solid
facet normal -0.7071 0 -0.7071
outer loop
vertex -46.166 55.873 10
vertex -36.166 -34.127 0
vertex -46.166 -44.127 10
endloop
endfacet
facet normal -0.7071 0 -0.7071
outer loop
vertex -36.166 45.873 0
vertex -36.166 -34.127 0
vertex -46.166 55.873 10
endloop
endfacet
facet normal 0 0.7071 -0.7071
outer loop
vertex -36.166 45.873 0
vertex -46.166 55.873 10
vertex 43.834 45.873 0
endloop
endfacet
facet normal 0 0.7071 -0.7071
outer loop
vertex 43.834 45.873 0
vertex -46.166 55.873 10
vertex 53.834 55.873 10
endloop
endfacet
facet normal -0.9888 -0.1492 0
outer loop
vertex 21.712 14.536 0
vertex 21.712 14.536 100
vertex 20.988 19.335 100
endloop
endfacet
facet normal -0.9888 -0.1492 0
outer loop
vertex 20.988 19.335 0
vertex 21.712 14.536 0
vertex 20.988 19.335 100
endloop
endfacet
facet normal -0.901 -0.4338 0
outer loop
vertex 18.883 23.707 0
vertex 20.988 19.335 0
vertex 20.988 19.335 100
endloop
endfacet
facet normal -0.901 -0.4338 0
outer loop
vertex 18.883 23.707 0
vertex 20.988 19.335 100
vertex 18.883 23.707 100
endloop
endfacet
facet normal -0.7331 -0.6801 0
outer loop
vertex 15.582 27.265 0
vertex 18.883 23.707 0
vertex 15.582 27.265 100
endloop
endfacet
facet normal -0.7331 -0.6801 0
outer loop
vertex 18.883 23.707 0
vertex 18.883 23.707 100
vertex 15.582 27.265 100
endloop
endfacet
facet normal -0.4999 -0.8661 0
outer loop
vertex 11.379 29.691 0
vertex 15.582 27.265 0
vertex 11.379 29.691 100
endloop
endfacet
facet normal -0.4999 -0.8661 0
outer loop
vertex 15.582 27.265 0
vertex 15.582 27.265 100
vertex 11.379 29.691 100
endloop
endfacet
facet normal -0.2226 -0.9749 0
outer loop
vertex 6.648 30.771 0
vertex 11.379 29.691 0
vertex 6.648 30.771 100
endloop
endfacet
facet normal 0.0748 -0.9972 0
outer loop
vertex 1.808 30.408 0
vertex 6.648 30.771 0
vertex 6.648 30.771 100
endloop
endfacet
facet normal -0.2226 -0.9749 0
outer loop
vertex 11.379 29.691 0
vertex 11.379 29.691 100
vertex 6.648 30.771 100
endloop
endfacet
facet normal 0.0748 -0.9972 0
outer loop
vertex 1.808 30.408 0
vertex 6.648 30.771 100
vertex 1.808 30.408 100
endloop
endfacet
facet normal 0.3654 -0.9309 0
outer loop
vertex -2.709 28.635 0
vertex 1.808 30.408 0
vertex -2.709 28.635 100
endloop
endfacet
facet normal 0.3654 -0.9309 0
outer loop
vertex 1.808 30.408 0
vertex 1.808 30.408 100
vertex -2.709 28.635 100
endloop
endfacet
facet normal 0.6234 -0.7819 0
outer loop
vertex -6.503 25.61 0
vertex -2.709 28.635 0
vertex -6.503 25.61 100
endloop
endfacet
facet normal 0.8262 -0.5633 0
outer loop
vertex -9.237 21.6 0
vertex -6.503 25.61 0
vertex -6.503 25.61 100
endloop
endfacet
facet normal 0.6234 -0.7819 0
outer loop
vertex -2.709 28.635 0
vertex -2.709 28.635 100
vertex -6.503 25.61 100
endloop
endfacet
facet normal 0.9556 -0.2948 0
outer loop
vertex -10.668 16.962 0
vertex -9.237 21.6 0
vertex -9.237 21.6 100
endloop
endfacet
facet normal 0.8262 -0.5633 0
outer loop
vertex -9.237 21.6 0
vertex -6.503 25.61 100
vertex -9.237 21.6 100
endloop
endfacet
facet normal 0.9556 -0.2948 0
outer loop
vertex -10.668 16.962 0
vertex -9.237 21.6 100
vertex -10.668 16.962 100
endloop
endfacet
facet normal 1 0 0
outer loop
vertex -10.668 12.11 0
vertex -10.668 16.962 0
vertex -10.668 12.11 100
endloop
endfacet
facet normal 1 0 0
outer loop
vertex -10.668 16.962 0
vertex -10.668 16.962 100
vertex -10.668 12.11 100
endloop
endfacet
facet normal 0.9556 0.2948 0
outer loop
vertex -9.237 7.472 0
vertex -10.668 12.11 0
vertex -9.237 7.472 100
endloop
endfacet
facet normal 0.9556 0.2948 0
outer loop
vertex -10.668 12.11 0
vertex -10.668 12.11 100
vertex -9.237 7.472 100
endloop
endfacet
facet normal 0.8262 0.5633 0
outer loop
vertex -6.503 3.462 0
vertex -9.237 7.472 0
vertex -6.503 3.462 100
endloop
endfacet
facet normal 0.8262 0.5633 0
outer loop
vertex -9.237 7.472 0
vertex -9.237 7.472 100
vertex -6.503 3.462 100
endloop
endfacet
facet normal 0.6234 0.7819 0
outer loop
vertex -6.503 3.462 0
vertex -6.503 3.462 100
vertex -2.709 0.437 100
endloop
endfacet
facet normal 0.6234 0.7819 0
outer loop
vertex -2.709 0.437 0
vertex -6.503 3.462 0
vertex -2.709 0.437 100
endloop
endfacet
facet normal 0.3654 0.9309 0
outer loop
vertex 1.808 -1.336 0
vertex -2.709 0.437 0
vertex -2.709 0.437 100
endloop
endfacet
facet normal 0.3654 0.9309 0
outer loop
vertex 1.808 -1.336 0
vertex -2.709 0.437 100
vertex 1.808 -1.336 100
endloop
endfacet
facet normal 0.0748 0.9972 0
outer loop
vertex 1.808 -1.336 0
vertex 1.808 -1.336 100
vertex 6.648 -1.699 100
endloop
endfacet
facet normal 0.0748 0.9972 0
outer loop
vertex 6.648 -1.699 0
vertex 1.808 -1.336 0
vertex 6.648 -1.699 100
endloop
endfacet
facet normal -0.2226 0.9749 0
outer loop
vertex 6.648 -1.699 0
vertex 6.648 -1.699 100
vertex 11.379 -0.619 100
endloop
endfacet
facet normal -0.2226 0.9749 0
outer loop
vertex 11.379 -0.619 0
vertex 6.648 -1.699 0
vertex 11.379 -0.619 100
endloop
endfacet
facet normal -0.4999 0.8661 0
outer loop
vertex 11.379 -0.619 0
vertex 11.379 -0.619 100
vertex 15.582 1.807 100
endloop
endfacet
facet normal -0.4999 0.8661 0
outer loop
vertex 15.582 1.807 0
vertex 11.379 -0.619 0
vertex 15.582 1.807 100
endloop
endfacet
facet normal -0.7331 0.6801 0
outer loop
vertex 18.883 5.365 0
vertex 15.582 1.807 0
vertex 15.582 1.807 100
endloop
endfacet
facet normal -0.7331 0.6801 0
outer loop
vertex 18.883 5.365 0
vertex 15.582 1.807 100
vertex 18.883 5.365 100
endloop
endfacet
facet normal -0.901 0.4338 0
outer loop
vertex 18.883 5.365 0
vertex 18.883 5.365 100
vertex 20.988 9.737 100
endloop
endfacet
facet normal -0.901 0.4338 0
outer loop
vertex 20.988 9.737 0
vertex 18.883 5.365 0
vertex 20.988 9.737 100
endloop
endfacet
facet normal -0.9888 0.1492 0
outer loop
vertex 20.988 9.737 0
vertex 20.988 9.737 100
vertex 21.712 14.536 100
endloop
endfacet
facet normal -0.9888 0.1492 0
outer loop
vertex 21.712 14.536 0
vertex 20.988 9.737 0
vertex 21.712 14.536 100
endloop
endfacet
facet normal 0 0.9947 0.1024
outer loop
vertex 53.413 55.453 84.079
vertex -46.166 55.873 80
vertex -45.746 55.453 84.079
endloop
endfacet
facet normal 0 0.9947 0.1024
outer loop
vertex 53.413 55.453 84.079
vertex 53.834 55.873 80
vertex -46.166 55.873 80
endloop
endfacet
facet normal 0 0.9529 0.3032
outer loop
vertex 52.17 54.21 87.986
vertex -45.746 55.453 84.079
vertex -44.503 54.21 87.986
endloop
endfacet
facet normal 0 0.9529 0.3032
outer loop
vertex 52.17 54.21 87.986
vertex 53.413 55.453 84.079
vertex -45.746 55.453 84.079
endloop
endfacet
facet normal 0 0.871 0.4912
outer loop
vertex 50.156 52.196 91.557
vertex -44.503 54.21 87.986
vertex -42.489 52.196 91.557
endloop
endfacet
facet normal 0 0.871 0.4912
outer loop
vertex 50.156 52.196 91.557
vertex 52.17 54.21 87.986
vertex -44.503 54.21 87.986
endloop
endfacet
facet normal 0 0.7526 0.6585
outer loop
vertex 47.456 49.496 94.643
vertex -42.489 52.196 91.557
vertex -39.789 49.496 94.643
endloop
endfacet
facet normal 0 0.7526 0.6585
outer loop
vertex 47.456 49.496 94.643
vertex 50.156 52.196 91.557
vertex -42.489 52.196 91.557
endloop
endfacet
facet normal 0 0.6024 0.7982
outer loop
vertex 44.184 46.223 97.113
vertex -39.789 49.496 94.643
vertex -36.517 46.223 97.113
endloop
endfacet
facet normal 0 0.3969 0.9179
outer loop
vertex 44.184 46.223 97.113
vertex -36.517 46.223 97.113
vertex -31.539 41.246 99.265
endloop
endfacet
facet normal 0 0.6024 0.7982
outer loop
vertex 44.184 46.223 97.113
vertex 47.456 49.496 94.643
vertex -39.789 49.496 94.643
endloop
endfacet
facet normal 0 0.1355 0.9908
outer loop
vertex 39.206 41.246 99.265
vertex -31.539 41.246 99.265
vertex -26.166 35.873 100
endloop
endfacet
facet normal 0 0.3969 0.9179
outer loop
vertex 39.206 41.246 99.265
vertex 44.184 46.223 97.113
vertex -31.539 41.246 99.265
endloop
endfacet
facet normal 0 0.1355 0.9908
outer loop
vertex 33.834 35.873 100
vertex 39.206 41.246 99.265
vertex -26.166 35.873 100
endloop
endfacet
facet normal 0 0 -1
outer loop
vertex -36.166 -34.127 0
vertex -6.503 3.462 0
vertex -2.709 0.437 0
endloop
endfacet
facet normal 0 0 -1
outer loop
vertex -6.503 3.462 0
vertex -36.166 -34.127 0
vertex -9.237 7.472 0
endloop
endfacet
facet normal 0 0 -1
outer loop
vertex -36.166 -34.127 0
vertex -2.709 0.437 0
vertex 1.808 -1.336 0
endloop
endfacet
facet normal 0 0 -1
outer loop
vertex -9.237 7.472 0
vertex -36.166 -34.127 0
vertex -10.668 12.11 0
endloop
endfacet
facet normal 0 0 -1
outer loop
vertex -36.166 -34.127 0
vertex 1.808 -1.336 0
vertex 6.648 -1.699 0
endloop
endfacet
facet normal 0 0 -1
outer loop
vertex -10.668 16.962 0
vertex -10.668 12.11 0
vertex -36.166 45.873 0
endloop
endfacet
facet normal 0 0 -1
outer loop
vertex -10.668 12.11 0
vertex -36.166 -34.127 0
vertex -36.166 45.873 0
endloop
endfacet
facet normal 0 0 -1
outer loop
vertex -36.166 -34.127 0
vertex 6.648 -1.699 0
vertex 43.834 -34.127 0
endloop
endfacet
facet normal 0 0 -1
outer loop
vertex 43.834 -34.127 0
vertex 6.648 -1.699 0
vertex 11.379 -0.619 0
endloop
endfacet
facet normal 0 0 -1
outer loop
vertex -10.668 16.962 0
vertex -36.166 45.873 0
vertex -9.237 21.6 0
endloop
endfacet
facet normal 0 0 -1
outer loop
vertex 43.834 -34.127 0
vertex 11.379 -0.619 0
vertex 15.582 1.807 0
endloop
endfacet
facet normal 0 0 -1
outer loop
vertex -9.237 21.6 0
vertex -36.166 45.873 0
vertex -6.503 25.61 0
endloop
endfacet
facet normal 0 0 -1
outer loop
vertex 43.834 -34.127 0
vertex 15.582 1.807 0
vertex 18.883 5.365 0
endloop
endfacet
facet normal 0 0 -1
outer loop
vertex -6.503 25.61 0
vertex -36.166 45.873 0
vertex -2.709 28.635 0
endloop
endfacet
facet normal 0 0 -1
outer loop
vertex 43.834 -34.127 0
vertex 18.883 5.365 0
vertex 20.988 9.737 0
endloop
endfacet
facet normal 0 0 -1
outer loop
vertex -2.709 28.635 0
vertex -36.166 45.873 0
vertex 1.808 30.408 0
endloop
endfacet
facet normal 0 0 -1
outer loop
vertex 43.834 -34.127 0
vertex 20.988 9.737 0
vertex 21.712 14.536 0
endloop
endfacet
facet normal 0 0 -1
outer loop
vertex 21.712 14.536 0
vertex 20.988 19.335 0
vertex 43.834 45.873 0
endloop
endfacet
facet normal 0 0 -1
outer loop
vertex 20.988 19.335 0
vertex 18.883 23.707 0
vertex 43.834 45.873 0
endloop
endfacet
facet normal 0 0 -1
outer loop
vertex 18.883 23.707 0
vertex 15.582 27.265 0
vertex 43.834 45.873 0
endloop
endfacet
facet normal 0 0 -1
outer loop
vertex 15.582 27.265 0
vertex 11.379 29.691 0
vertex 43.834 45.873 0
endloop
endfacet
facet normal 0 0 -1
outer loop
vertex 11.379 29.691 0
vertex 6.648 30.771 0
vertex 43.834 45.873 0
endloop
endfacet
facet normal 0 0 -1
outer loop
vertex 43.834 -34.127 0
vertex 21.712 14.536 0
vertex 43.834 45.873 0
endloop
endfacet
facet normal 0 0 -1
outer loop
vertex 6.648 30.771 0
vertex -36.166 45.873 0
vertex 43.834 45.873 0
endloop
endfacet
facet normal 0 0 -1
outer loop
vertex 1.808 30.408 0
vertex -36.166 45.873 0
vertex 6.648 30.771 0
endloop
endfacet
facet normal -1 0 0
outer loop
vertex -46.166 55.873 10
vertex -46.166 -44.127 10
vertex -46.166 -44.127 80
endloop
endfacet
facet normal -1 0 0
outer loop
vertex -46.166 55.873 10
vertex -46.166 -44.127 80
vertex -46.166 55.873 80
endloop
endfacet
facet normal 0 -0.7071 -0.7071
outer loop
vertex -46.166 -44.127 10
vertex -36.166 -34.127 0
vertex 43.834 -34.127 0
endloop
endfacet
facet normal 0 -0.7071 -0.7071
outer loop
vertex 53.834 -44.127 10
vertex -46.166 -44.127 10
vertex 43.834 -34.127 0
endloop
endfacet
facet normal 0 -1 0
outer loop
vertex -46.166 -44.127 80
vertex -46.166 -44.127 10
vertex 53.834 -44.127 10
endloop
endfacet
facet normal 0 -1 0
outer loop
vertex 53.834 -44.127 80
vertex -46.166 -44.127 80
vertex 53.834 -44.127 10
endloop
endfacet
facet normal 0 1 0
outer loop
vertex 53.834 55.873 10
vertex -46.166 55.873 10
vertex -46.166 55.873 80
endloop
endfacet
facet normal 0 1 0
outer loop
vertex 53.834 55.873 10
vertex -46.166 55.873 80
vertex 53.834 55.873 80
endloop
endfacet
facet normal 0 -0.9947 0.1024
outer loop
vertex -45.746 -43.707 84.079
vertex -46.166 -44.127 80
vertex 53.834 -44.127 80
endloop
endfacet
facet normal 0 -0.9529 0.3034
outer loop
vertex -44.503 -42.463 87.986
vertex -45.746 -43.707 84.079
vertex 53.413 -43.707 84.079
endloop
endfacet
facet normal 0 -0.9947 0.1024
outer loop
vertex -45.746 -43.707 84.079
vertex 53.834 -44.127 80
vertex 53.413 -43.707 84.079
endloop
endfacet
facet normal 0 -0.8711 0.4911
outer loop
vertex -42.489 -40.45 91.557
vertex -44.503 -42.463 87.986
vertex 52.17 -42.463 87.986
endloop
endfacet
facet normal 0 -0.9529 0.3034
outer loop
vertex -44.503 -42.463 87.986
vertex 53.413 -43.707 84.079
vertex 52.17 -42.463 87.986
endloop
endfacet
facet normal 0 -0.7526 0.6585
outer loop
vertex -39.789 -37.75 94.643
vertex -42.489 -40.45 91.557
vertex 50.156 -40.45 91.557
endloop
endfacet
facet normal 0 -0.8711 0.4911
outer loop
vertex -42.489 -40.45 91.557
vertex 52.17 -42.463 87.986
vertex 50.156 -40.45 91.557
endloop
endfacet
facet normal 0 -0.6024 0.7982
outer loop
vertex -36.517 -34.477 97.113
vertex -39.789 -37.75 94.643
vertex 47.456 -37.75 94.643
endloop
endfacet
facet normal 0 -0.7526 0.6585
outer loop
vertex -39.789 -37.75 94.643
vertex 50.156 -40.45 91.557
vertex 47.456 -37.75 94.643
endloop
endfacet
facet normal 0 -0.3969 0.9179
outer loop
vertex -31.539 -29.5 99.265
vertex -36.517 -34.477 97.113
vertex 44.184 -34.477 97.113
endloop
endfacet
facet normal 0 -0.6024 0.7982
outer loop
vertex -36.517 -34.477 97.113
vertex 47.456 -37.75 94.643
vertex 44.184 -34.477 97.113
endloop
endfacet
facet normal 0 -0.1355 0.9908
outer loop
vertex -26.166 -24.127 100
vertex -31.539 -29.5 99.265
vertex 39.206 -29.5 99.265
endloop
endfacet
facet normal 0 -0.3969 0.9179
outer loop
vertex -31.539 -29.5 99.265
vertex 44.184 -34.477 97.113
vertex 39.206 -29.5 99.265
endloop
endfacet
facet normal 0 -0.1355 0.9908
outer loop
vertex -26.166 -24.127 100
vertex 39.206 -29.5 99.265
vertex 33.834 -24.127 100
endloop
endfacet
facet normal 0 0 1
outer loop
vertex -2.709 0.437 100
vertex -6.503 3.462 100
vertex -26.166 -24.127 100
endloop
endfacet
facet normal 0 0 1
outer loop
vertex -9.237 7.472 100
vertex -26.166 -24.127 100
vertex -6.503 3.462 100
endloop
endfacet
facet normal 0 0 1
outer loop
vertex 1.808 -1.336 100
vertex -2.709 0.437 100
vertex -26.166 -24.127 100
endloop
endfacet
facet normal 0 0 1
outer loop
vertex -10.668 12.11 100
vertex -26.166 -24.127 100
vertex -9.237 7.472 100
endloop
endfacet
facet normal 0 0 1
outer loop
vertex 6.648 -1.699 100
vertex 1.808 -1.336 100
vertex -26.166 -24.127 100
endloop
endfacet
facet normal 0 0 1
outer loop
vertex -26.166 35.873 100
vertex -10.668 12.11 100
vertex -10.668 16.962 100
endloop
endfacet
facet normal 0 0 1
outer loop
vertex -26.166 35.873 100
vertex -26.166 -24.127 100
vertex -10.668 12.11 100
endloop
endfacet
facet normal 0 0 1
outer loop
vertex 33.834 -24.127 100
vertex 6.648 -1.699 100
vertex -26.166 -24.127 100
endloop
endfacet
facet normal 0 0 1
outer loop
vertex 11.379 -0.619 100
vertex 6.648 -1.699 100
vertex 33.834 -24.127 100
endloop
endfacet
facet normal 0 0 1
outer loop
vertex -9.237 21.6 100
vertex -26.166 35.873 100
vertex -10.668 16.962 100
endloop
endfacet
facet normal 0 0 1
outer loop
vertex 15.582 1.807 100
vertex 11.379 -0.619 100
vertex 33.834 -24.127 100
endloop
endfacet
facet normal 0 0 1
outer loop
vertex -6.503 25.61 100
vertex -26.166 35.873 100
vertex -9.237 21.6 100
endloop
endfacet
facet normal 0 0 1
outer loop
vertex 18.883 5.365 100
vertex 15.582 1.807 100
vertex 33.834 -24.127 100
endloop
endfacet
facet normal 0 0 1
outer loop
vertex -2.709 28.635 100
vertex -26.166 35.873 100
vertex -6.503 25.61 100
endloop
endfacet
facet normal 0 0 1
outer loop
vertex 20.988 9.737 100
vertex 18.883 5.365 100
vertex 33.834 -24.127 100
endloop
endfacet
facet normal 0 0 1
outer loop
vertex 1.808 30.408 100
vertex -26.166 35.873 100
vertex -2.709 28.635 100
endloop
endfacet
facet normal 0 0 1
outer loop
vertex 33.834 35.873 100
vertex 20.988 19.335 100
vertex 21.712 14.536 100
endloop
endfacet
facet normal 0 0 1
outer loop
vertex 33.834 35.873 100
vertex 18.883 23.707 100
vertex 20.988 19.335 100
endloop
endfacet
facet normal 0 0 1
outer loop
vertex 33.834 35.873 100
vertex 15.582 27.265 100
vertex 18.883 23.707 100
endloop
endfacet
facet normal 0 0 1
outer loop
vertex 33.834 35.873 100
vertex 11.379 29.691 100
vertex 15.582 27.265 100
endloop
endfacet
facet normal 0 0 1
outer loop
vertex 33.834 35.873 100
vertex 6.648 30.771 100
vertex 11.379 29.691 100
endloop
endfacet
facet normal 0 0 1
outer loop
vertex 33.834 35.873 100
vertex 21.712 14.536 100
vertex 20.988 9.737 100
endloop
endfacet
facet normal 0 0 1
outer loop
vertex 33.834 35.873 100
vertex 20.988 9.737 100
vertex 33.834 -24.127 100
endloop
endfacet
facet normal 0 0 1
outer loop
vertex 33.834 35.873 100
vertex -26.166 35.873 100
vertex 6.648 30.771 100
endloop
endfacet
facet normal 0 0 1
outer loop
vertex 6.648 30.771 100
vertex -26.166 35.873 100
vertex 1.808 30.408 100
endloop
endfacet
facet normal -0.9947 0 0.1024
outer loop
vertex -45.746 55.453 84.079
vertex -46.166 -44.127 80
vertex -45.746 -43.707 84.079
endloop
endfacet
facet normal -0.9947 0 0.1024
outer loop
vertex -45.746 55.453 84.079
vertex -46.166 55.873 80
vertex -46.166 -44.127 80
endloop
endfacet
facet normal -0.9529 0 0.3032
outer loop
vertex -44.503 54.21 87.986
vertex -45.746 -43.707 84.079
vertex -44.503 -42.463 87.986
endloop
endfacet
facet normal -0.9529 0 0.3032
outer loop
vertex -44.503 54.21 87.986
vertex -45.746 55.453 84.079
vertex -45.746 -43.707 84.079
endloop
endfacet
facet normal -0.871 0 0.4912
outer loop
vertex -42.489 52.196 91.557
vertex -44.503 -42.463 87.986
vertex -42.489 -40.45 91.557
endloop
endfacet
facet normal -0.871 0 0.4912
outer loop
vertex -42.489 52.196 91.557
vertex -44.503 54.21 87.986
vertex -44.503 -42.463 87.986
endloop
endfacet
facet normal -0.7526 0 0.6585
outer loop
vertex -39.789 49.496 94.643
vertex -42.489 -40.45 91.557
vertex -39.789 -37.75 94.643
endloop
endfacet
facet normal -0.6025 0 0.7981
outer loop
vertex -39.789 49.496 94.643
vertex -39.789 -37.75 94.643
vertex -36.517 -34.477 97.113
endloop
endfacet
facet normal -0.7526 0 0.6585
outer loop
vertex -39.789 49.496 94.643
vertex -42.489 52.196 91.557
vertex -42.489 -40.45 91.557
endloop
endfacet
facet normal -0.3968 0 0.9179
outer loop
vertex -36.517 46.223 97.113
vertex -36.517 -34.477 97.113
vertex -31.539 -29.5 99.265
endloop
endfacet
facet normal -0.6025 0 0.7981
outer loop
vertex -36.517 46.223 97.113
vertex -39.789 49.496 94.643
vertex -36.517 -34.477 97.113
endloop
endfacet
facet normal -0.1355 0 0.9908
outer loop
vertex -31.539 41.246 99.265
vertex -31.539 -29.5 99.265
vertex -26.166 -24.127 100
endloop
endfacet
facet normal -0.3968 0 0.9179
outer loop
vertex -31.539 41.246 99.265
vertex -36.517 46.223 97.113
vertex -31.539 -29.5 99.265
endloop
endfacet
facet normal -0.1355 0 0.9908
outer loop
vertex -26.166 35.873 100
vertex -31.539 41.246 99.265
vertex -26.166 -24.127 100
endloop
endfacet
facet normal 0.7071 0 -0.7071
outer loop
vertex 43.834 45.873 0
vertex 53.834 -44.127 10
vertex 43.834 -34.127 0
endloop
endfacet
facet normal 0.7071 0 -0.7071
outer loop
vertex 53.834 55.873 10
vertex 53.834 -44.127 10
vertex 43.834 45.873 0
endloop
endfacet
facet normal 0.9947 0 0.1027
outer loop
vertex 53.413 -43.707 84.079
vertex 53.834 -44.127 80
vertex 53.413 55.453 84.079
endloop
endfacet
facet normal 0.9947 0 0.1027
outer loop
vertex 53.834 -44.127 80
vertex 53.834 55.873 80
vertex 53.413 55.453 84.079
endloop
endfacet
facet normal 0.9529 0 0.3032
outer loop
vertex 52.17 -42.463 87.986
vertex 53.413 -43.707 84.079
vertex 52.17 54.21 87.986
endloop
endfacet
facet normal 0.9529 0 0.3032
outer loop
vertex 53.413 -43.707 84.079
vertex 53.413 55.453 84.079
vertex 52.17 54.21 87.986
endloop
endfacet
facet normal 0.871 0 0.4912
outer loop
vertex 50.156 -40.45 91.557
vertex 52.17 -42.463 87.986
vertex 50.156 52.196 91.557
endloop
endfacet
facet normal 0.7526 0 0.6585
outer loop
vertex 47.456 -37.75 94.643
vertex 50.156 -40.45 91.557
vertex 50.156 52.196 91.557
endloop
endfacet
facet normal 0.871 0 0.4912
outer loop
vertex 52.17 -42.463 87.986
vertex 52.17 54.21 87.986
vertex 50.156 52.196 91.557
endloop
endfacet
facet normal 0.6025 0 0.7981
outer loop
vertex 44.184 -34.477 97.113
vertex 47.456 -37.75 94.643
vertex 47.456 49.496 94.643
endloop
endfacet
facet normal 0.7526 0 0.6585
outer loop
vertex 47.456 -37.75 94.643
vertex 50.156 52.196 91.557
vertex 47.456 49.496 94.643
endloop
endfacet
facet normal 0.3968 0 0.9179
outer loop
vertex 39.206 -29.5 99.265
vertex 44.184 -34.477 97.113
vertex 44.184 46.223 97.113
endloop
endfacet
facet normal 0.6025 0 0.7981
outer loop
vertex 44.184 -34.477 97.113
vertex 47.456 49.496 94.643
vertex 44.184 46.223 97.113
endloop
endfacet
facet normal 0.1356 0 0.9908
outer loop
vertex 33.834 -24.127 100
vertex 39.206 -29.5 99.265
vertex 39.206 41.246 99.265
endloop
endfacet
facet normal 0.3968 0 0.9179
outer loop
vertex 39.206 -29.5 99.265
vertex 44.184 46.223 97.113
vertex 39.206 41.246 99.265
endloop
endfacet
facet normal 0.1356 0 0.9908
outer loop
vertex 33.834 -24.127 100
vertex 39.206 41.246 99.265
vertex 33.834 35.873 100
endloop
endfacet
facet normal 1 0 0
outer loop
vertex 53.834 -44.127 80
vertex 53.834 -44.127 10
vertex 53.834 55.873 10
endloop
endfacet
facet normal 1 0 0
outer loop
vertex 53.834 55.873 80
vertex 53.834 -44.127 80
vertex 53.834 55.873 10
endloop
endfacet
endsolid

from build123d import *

# Parameters (mm, degrees)
F0_W     = 100
F0_H     = 100
F1_DEPTH = 100
F2_R     = 20
F3_SIZE  = 10
F4_R     = 16.280572
F5_DEPTH = 173.821


with BuildPart() as f1:
    # F0 (on Top) → F1 (new body)
    with BuildSketch(Plane.XY):
        with Locations((3.83367, 5.873055)):
            Rectangle(F0_W, F0_H)
    extrude(amount=F1_DEPTH)

    # F2
    f2_edges = [f1.edges().sort_by_distance(p)[0] for p in [
        (-46.16633, 5.873055, 100),
        (3.83367, -44.126945, 100),
        (3.83367, 55.873055, 100),
        (53.83367, 5.873055, 100),
    ]]
    fillet(f2_edges, radius=F2_R)

    # F3
    f3_edges = [f1.edges().sort_by_distance(p)[0] for p in [
        (3.83367, -44.126945, 0),
        (53.83367, 5.873055, 0),
        (3.83367, 55.873055, 0),
        (-46.16633, 5.873055, 0),
    ]]
    chamfer(f3_edges, length=F3_SIZE)

    # F4 (on face) → F5 (cut)
    with BuildSketch(Plane.XY.offset(100)):
        with Locations((5.431035, 14.536005)):
            Circle(F4_R)
    extrude(amount=-F5_DEPTH, mode=Mode.SUBTRACT)


solid = f1.part
